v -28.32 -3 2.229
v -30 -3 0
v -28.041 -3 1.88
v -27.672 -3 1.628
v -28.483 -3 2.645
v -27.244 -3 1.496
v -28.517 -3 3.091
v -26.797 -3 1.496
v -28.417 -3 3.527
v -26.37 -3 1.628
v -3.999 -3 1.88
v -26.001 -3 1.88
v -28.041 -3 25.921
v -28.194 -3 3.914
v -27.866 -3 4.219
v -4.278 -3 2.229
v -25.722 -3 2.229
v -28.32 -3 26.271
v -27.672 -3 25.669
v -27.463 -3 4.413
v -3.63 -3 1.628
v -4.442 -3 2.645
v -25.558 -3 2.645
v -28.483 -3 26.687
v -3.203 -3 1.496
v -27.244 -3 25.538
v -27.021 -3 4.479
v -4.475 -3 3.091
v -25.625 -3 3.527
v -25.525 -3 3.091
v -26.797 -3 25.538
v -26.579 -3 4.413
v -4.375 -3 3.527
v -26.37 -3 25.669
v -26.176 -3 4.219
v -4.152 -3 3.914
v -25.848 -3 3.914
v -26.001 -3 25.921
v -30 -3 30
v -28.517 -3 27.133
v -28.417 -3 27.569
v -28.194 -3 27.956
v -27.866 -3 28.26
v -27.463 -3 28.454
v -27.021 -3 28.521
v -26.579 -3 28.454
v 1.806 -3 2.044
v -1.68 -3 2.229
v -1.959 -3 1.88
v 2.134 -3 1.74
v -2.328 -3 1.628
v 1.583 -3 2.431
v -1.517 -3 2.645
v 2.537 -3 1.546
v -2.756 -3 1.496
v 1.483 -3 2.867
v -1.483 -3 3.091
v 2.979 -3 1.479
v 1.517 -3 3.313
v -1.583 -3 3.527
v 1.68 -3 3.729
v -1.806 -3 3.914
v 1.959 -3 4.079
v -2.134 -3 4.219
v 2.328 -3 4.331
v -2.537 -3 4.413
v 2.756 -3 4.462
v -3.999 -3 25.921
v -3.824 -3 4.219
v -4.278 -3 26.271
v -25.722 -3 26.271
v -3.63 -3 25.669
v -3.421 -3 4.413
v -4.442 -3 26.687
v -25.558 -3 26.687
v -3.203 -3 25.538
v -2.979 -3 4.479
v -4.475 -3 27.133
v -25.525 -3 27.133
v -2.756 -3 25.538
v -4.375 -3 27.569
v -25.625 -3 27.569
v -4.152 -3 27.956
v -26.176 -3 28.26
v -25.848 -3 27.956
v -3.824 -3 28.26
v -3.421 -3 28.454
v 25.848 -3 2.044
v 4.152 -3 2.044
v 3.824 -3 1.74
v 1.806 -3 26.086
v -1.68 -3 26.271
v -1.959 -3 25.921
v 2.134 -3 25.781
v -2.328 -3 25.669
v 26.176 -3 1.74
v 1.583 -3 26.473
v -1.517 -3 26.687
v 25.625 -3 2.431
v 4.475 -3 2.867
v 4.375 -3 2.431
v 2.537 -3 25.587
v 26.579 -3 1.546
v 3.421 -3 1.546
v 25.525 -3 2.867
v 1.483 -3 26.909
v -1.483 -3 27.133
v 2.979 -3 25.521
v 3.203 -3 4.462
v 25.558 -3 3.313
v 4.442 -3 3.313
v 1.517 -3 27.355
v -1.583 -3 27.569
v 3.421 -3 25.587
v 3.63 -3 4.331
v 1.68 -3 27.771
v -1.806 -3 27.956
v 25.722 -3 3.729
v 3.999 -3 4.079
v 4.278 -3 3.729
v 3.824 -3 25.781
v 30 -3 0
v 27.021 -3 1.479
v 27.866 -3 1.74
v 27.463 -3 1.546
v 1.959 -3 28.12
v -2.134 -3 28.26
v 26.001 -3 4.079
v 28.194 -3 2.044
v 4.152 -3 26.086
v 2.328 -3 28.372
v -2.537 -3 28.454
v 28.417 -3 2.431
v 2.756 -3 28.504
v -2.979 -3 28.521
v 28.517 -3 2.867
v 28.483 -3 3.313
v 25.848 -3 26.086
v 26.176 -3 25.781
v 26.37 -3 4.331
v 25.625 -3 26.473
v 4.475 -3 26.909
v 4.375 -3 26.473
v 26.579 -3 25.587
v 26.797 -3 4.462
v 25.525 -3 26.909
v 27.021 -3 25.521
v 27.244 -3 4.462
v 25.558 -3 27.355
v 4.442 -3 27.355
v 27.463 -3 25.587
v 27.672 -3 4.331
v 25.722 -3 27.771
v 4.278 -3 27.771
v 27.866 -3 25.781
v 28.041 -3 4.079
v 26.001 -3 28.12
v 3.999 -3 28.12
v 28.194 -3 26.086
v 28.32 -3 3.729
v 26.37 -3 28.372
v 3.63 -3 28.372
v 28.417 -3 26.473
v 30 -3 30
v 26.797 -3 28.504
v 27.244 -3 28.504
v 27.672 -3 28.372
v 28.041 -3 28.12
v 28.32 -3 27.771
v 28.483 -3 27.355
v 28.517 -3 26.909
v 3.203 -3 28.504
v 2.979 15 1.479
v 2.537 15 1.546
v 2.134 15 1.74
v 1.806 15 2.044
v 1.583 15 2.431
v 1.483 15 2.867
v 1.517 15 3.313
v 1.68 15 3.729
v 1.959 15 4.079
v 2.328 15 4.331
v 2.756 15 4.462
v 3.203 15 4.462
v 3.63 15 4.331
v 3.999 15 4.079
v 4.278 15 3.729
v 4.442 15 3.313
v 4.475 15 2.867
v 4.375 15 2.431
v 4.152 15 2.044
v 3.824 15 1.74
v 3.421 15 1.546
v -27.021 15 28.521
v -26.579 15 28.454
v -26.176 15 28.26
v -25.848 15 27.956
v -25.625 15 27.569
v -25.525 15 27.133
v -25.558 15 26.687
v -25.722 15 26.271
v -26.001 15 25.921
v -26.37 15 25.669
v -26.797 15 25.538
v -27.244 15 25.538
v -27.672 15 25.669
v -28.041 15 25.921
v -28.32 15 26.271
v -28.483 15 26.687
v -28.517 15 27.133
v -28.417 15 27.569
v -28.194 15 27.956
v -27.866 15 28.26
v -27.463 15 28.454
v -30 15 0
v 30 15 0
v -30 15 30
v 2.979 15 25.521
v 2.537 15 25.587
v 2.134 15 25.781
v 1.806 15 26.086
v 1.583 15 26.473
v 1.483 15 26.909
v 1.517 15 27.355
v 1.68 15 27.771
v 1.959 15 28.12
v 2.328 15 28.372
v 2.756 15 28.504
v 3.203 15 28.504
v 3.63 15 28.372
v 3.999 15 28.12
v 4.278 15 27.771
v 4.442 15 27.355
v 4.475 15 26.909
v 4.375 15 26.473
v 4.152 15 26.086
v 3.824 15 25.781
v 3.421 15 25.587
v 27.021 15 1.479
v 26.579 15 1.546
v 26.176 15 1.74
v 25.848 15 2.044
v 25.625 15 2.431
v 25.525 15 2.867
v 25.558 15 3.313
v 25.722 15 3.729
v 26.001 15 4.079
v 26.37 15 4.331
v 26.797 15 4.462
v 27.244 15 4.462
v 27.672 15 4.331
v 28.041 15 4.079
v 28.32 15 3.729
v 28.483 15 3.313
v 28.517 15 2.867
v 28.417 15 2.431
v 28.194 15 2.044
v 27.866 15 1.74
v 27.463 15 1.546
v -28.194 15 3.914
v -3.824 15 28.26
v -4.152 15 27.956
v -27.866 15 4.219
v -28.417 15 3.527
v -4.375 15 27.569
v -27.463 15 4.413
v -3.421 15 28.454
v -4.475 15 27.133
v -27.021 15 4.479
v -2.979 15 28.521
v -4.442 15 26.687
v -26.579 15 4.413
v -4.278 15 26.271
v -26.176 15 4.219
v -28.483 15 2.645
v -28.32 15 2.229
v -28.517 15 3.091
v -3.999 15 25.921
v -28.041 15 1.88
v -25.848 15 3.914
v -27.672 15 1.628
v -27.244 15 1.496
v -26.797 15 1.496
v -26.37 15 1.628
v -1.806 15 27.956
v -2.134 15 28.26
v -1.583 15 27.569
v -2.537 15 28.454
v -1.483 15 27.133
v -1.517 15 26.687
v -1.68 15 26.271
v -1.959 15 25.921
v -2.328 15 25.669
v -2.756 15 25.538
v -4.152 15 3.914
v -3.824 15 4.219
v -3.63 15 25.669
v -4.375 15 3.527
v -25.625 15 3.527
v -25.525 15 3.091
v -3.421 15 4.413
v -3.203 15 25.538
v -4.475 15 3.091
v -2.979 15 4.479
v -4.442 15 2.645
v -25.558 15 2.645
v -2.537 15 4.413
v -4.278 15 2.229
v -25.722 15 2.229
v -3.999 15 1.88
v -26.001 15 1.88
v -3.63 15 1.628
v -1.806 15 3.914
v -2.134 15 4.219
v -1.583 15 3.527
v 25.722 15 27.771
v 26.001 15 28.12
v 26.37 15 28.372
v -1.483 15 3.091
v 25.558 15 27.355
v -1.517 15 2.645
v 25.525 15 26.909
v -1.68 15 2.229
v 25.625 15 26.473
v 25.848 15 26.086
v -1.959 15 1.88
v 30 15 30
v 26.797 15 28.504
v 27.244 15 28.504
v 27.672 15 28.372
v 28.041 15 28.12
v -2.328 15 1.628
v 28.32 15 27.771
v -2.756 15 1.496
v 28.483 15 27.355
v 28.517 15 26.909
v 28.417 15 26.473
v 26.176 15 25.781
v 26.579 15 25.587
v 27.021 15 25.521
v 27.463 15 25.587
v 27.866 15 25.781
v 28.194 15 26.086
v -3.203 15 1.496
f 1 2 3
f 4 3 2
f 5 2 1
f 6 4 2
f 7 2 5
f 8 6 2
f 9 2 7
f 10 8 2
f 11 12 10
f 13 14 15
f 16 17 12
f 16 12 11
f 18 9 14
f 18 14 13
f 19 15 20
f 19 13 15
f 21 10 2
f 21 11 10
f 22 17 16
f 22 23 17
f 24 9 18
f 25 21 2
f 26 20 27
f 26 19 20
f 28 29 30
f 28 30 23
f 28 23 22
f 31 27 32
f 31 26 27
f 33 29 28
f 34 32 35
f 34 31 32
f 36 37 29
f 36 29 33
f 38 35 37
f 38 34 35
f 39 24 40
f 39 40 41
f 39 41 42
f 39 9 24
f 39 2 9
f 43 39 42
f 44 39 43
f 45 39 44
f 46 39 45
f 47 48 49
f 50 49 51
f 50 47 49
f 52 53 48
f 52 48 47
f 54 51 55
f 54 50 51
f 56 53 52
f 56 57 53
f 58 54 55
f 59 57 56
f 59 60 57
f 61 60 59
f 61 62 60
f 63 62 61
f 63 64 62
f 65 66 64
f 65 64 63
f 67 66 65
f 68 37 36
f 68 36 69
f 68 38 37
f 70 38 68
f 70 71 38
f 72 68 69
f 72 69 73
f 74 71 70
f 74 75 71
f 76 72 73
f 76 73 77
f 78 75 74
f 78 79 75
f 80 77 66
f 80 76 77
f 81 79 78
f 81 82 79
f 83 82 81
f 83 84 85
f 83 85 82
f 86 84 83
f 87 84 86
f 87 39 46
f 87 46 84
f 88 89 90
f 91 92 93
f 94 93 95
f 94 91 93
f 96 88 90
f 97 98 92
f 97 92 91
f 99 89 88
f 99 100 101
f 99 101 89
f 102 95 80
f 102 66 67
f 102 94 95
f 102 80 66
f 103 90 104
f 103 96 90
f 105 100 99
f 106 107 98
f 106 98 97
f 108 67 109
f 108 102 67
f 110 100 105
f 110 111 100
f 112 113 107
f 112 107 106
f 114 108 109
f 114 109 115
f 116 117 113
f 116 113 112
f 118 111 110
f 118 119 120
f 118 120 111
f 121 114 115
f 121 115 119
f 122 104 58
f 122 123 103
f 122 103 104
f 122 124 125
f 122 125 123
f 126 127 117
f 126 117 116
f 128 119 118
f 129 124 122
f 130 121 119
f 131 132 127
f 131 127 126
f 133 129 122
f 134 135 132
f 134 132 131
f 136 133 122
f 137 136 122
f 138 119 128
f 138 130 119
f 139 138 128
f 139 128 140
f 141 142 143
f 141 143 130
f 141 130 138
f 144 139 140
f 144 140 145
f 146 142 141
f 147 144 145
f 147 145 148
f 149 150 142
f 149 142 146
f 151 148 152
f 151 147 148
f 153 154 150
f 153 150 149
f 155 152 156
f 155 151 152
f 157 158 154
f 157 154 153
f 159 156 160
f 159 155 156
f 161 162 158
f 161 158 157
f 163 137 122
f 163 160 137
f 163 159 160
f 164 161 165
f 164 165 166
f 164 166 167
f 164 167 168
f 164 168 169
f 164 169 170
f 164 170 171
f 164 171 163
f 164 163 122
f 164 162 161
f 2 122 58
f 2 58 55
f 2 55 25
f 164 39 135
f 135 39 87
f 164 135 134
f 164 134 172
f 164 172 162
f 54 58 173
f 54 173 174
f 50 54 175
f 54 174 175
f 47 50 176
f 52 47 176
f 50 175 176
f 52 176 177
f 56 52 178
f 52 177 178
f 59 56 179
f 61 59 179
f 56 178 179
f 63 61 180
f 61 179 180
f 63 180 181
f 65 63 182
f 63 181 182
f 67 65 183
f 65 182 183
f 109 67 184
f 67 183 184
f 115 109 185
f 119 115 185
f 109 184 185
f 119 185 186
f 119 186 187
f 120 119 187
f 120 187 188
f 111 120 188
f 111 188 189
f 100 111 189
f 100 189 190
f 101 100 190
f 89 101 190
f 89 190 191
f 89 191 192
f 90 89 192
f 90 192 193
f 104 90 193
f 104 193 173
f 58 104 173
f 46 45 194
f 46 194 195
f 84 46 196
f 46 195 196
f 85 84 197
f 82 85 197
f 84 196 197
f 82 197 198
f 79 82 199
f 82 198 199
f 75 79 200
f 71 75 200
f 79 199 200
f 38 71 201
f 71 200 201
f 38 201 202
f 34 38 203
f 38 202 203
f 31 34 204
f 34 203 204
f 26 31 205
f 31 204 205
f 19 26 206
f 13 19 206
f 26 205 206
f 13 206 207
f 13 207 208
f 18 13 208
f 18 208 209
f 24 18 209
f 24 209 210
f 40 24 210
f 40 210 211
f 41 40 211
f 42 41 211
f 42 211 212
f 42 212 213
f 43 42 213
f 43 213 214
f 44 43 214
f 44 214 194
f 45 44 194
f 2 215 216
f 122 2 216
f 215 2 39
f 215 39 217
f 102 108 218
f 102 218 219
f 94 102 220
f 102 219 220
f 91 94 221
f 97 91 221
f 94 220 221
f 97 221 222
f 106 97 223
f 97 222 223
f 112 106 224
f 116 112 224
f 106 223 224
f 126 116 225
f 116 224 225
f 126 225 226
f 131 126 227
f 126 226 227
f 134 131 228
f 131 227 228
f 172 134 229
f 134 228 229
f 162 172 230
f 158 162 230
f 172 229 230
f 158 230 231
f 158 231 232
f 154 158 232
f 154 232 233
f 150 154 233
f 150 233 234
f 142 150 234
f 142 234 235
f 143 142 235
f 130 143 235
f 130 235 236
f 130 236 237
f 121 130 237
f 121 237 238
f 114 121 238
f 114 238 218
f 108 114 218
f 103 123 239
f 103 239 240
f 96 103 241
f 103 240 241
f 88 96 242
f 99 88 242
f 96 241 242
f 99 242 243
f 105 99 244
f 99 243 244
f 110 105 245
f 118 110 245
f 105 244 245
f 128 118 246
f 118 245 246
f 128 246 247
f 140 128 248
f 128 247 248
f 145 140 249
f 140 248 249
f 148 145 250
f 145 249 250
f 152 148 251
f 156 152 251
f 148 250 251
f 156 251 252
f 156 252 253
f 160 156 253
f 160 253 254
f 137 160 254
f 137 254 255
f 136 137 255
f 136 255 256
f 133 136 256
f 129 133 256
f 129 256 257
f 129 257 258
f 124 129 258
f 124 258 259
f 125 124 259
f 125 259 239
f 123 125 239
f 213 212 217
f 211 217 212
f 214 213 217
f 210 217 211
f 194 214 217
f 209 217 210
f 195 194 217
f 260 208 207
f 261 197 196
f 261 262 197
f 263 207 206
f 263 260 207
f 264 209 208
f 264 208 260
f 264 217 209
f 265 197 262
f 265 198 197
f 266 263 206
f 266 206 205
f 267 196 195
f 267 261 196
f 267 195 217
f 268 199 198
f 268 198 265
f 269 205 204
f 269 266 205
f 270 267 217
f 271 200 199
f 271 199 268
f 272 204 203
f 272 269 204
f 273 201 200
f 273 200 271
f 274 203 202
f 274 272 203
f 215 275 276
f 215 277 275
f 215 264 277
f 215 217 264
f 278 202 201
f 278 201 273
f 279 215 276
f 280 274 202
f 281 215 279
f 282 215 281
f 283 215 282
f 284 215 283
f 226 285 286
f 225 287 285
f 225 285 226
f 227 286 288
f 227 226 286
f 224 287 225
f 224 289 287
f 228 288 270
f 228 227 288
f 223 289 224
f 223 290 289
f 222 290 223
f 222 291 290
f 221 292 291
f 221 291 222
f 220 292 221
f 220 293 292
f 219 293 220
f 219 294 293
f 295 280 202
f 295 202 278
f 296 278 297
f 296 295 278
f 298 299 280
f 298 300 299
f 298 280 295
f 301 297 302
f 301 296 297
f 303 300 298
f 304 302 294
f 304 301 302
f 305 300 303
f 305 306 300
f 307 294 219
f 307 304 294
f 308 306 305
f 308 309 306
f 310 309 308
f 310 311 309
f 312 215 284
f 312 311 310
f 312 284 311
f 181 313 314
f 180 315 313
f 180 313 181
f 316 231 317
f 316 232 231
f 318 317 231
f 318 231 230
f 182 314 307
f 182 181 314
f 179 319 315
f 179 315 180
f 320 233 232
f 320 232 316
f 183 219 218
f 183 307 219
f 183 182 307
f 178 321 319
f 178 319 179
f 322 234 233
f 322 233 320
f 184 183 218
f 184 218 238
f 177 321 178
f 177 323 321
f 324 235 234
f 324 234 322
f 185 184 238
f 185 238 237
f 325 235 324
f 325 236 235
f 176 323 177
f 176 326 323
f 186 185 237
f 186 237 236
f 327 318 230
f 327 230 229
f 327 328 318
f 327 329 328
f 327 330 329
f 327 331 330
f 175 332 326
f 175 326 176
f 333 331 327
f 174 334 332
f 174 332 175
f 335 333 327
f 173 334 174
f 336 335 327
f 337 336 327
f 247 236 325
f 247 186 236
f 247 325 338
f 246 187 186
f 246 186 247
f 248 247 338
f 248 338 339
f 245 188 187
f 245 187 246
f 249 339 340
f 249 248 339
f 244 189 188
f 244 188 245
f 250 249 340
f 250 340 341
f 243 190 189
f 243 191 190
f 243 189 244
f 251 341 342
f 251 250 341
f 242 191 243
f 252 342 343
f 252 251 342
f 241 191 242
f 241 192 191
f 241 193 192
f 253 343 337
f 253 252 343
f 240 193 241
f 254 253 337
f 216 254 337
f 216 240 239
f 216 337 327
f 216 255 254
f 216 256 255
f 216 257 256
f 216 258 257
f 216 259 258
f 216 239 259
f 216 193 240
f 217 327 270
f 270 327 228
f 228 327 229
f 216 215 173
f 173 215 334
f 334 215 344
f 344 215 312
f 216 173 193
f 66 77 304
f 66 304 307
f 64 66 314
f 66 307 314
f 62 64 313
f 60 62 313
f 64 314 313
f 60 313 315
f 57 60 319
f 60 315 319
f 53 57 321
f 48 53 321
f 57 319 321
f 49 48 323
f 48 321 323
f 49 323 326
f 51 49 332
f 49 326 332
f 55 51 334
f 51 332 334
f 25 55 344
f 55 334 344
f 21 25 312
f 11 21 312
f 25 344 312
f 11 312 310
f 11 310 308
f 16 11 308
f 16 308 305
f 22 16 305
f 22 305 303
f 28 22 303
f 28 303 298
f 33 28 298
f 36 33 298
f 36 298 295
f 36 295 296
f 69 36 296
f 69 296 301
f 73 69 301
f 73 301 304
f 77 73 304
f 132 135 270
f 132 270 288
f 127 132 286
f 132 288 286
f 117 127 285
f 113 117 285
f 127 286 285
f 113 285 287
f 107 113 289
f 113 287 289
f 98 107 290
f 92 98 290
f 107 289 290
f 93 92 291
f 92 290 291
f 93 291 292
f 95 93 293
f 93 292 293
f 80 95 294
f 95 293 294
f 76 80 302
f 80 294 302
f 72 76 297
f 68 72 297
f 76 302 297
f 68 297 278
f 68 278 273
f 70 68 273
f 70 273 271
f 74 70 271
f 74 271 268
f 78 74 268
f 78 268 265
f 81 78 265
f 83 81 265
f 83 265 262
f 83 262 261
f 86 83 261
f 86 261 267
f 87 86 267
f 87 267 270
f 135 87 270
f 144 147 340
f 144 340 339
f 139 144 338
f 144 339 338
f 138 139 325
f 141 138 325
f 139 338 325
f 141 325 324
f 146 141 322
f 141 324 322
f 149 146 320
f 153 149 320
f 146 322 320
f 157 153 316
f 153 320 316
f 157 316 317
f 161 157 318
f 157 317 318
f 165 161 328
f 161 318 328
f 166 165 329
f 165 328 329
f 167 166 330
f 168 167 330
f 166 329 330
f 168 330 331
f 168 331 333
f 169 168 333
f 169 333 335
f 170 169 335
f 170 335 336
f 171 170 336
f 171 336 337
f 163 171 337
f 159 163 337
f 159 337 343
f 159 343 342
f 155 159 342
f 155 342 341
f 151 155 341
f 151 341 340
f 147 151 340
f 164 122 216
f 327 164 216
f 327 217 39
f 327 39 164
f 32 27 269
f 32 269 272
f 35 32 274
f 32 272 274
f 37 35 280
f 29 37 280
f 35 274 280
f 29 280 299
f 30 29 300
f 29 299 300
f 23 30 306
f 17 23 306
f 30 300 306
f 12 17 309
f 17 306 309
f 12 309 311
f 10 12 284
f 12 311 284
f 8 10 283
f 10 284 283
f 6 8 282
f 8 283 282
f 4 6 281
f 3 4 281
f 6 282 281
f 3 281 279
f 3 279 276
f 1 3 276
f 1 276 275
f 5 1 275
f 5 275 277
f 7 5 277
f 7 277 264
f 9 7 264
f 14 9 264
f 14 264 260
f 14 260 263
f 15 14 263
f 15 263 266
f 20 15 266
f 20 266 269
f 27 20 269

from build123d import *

# Parameters (mm, degrees)
SKETCH_1_W          = 60
SKETCH_1_H          = 30
EXTRUDE_1_DEPTH     = 30
SKETCH_2_W          = 60
SKETCH_2_H          = 30
CUT_EXTRUDE_1_DEPTH = 12
SKETCH_3_R          = 1.5
CUT_EXTRUDE_2_DEPTH = 47.086874487


with BuildPart() as part:
    # 草图1 → 凸台-拉伸1 (new body)
    with BuildSketch(Plane.XY):
        Rectangle(SKETCH_1_W, SKETCH_1_H)
    extrude(amount=EXTRUDE_1_DEPTH)

    # 草图2 → 切除-拉伸1 (cut)
    with BuildSketch(Plane.XZ.offset(15)):
        with Locations((0, 15)):
            Rectangle(SKETCH_2_W, SKETCH_2_H)
    extrude(amount=-CUT_EXTRUDE_1_DEPTH, mode=Mode.SUBTRACT)

    # 草图3 → 切除-拉伸2 (cut, through all)
    with BuildSketch(Plane(origin=(0, 15, 0), x_dir=(1, 0, 0), z_dir=(0, 1, 0))):
        with Locations(Location((-27.02081528, -2.97918472, 0), (0, 0, 270))):
            Circle(SKETCH_3_R)
        with Locations(Location((-2.97918472, -2.97918472, 0), (0, 0, 270))):
            Circle(SKETCH_3_R)
        with Locations(Location((-2.97918472, -27.02081528, 0), (0, 0, 270))):
            Circle(SKETCH_3_R)
        with Locations(Location((-27.02081528, -27.02081528, 0), (0, 0, 270))):
            Circle(SKETCH_3_R)
        with Locations(Location((27.02081528, -27.02081528, 0), (0, 0, 90))):
            Circle(SKETCH_3_R)
        with Locations(Location((2.97918472, -27.02081528, 0), (0, 0, 90))):
            Circle(SKETCH_3_R)
        with Locations(Location((2.97918472, -2.97918472, 0), (0, 0, 90))):
            Circle(SKETCH_3_R)
        with Locations(Location((27.02081528, -2.97918472, 0), (0, 0, 90))):
            Circle(SKETCH_3_R)
    extrude(amount=-CUT_EXTRUDE_2_DEPTH, mode=Mode.SUBTRACT)


solid = part.part
